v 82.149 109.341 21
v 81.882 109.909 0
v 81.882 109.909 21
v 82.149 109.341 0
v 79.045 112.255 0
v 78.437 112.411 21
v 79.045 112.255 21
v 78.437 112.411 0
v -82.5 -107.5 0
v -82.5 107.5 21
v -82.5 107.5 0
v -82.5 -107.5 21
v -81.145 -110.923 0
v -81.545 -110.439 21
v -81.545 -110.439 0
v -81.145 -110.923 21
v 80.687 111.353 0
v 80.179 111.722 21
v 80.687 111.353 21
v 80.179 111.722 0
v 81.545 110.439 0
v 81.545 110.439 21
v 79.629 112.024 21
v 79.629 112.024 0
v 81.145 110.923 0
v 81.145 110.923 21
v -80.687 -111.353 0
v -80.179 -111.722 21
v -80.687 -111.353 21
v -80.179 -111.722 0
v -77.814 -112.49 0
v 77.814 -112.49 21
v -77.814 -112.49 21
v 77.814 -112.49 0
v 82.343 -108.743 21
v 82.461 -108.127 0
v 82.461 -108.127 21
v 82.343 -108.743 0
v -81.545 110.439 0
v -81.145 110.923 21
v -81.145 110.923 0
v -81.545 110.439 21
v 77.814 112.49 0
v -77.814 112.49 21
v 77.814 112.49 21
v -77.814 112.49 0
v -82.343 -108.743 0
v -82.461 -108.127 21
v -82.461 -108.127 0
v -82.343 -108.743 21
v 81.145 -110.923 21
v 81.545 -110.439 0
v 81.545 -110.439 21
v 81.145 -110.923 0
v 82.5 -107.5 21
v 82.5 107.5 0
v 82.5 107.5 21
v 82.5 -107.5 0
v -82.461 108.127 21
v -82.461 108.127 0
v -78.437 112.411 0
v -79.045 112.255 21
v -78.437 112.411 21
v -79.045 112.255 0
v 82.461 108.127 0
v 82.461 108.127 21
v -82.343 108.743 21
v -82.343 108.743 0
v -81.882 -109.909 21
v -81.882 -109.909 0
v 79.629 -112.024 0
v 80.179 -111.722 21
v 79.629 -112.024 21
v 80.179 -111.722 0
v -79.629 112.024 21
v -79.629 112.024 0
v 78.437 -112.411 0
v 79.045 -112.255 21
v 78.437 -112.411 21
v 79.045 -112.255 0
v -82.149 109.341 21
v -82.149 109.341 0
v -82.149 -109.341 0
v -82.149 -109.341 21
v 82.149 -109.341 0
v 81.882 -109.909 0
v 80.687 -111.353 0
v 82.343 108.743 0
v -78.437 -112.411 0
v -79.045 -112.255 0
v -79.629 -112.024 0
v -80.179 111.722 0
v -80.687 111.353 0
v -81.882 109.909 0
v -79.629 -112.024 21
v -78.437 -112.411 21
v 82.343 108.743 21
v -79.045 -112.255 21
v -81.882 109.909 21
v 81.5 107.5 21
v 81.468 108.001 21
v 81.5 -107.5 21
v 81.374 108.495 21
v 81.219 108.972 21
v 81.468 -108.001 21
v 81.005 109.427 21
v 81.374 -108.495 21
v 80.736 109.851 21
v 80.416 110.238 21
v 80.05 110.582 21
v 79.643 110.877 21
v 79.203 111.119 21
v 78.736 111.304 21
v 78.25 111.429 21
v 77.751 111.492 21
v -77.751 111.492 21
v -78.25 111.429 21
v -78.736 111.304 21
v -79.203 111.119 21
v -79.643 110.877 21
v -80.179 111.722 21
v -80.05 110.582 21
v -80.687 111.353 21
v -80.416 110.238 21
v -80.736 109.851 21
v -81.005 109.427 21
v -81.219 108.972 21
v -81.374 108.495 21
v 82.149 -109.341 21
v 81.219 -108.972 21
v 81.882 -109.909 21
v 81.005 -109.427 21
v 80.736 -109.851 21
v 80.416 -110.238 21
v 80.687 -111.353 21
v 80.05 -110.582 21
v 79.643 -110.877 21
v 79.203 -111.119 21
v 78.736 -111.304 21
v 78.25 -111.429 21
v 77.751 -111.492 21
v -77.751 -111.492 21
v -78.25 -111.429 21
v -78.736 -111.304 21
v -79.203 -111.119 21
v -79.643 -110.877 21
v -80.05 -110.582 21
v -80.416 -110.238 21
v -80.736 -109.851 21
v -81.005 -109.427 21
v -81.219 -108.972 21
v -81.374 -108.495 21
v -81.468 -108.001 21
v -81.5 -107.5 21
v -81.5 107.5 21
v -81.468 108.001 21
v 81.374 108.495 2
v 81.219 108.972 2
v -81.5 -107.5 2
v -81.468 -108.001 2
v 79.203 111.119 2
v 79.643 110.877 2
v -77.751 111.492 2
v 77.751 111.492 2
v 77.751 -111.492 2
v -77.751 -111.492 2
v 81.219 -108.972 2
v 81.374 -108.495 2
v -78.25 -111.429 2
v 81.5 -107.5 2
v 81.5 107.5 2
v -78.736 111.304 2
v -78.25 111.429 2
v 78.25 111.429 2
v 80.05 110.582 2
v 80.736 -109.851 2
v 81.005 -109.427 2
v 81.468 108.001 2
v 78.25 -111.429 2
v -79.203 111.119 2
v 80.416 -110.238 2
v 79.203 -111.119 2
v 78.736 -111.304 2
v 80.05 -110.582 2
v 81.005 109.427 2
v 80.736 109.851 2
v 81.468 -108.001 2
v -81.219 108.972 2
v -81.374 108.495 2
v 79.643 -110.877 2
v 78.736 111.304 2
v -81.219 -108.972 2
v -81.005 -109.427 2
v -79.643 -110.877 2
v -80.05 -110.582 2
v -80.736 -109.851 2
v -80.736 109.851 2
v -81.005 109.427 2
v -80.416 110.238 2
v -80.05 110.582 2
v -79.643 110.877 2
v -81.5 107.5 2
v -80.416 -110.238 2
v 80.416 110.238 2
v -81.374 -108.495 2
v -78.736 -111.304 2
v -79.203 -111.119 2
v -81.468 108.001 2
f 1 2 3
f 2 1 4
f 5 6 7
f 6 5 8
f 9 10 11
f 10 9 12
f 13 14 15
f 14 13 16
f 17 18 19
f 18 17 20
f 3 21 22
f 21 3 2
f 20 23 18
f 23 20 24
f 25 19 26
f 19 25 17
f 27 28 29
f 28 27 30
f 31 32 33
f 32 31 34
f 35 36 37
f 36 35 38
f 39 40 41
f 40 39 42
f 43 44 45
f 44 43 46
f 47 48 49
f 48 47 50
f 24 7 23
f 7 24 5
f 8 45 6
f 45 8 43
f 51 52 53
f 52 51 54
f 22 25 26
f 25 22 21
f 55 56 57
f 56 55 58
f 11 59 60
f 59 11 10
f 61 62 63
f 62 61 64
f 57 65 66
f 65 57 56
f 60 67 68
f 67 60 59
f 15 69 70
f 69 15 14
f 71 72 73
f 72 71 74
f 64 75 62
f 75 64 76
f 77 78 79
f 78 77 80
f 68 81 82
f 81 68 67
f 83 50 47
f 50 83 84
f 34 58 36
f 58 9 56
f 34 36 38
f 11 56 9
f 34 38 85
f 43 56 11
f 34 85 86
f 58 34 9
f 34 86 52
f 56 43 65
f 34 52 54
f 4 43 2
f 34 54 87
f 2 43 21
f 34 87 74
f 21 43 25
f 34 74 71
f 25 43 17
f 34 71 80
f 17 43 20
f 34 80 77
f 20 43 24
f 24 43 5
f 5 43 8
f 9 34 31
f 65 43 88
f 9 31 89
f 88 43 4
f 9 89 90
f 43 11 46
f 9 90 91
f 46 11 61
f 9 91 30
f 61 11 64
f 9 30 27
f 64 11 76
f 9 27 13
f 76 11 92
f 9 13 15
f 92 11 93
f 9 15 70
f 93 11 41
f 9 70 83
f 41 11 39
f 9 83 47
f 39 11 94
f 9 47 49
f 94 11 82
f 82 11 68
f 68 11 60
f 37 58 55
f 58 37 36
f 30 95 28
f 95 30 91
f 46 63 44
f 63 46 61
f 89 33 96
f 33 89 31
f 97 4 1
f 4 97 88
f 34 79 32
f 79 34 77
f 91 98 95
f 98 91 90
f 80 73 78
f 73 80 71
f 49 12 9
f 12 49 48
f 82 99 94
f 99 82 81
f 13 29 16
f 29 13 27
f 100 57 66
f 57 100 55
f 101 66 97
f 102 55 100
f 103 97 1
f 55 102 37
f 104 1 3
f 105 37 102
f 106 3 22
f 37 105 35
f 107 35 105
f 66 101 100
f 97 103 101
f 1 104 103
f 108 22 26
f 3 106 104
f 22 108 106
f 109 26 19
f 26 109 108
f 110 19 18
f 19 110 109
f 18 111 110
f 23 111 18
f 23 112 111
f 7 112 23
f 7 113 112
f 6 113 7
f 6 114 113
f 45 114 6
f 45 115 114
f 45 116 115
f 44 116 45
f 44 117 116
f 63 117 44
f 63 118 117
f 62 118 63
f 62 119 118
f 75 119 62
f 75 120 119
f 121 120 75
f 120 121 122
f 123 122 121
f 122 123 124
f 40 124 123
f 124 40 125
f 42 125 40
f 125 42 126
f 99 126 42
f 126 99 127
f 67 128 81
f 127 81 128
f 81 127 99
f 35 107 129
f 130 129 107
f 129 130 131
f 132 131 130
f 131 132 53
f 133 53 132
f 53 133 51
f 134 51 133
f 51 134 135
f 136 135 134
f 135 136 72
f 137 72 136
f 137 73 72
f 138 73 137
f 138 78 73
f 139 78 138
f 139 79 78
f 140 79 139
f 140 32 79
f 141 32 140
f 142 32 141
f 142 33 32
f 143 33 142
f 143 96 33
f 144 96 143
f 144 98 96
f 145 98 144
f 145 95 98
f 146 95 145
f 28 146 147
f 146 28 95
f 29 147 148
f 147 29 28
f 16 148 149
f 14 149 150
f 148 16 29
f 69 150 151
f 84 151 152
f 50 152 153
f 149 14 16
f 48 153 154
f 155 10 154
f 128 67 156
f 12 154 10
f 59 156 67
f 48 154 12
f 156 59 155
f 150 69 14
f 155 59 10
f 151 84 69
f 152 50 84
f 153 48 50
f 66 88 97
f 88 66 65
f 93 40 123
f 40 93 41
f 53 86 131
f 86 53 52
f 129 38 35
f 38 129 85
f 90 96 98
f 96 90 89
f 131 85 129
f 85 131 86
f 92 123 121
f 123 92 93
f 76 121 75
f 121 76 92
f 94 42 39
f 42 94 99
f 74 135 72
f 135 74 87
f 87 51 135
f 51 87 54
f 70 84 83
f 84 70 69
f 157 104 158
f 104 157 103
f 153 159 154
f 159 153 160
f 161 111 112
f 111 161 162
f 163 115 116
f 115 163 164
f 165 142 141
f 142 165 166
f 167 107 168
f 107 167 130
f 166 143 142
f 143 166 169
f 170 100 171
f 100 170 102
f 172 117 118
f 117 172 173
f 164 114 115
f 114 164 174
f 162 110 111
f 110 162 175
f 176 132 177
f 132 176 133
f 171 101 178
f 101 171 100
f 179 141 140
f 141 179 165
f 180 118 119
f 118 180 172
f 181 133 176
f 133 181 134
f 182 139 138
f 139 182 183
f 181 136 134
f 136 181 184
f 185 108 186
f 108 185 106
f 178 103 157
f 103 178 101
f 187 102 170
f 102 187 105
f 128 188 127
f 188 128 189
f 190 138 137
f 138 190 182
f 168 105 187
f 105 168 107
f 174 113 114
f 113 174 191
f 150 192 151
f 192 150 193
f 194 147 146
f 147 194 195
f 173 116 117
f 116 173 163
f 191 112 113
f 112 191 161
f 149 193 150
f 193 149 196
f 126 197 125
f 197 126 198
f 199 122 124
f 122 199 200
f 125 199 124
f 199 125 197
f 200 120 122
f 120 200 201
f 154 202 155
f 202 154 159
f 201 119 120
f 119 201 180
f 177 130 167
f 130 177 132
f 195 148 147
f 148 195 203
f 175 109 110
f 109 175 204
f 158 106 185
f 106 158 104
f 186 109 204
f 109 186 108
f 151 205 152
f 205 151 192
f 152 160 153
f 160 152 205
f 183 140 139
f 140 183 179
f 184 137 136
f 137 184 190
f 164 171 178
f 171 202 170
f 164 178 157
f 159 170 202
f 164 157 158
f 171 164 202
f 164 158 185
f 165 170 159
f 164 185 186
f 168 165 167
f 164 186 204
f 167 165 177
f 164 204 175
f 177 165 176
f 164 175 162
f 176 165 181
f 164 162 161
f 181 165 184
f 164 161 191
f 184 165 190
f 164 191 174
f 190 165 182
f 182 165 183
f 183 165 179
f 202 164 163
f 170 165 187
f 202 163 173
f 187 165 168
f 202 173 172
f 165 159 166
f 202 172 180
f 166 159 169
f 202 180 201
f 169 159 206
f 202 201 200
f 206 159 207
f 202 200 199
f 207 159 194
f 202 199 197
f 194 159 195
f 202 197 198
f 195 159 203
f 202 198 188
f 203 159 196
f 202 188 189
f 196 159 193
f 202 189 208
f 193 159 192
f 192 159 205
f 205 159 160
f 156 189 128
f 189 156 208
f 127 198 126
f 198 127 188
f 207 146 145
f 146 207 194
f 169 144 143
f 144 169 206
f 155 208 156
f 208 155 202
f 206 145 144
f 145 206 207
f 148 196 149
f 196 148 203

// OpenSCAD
$fn = 50;


difference() {
	union() {
		hull() {
			translate(v = [-77.5000000000, 107.5000000000, 0]) {
				cylinder(h = 21, r = 5);
			}
			translate(v = [77.5000000000, 107.5000000000, 0]) {
				cylinder(h = 21, r = 5);
			}
			translate(v = [-77.5000000000, -107.5000000000, 0]) {
				cylinder(h = 21, r = 5);
			}
			translate(v = [77.5000000000, -107.5000000000, 0]) {
				cylinder(h = 21, r = 5);
			}
		}
	}
	union() {
		translate(v = [0, 0, 2]) {
			hull() {
				translate(v = [-77.5000000000, 107.5000000000, 0]) {
					cylinder(h = 19, r = 4);
				}
				translate(v = [77.5000000000, 107.5000000000, 0]) {
					cylinder(h = 19, r = 4);
				}
				translate(v = [-77.5000000000, -107.5000000000, 0]) {
					cylinder(h = 19, r = 4);
				}
				translate(v = [77.5000000000, -107.5000000000, 0]) {
					cylinder(h = 19, r = 4);
				}
			}
		}
	}
}
